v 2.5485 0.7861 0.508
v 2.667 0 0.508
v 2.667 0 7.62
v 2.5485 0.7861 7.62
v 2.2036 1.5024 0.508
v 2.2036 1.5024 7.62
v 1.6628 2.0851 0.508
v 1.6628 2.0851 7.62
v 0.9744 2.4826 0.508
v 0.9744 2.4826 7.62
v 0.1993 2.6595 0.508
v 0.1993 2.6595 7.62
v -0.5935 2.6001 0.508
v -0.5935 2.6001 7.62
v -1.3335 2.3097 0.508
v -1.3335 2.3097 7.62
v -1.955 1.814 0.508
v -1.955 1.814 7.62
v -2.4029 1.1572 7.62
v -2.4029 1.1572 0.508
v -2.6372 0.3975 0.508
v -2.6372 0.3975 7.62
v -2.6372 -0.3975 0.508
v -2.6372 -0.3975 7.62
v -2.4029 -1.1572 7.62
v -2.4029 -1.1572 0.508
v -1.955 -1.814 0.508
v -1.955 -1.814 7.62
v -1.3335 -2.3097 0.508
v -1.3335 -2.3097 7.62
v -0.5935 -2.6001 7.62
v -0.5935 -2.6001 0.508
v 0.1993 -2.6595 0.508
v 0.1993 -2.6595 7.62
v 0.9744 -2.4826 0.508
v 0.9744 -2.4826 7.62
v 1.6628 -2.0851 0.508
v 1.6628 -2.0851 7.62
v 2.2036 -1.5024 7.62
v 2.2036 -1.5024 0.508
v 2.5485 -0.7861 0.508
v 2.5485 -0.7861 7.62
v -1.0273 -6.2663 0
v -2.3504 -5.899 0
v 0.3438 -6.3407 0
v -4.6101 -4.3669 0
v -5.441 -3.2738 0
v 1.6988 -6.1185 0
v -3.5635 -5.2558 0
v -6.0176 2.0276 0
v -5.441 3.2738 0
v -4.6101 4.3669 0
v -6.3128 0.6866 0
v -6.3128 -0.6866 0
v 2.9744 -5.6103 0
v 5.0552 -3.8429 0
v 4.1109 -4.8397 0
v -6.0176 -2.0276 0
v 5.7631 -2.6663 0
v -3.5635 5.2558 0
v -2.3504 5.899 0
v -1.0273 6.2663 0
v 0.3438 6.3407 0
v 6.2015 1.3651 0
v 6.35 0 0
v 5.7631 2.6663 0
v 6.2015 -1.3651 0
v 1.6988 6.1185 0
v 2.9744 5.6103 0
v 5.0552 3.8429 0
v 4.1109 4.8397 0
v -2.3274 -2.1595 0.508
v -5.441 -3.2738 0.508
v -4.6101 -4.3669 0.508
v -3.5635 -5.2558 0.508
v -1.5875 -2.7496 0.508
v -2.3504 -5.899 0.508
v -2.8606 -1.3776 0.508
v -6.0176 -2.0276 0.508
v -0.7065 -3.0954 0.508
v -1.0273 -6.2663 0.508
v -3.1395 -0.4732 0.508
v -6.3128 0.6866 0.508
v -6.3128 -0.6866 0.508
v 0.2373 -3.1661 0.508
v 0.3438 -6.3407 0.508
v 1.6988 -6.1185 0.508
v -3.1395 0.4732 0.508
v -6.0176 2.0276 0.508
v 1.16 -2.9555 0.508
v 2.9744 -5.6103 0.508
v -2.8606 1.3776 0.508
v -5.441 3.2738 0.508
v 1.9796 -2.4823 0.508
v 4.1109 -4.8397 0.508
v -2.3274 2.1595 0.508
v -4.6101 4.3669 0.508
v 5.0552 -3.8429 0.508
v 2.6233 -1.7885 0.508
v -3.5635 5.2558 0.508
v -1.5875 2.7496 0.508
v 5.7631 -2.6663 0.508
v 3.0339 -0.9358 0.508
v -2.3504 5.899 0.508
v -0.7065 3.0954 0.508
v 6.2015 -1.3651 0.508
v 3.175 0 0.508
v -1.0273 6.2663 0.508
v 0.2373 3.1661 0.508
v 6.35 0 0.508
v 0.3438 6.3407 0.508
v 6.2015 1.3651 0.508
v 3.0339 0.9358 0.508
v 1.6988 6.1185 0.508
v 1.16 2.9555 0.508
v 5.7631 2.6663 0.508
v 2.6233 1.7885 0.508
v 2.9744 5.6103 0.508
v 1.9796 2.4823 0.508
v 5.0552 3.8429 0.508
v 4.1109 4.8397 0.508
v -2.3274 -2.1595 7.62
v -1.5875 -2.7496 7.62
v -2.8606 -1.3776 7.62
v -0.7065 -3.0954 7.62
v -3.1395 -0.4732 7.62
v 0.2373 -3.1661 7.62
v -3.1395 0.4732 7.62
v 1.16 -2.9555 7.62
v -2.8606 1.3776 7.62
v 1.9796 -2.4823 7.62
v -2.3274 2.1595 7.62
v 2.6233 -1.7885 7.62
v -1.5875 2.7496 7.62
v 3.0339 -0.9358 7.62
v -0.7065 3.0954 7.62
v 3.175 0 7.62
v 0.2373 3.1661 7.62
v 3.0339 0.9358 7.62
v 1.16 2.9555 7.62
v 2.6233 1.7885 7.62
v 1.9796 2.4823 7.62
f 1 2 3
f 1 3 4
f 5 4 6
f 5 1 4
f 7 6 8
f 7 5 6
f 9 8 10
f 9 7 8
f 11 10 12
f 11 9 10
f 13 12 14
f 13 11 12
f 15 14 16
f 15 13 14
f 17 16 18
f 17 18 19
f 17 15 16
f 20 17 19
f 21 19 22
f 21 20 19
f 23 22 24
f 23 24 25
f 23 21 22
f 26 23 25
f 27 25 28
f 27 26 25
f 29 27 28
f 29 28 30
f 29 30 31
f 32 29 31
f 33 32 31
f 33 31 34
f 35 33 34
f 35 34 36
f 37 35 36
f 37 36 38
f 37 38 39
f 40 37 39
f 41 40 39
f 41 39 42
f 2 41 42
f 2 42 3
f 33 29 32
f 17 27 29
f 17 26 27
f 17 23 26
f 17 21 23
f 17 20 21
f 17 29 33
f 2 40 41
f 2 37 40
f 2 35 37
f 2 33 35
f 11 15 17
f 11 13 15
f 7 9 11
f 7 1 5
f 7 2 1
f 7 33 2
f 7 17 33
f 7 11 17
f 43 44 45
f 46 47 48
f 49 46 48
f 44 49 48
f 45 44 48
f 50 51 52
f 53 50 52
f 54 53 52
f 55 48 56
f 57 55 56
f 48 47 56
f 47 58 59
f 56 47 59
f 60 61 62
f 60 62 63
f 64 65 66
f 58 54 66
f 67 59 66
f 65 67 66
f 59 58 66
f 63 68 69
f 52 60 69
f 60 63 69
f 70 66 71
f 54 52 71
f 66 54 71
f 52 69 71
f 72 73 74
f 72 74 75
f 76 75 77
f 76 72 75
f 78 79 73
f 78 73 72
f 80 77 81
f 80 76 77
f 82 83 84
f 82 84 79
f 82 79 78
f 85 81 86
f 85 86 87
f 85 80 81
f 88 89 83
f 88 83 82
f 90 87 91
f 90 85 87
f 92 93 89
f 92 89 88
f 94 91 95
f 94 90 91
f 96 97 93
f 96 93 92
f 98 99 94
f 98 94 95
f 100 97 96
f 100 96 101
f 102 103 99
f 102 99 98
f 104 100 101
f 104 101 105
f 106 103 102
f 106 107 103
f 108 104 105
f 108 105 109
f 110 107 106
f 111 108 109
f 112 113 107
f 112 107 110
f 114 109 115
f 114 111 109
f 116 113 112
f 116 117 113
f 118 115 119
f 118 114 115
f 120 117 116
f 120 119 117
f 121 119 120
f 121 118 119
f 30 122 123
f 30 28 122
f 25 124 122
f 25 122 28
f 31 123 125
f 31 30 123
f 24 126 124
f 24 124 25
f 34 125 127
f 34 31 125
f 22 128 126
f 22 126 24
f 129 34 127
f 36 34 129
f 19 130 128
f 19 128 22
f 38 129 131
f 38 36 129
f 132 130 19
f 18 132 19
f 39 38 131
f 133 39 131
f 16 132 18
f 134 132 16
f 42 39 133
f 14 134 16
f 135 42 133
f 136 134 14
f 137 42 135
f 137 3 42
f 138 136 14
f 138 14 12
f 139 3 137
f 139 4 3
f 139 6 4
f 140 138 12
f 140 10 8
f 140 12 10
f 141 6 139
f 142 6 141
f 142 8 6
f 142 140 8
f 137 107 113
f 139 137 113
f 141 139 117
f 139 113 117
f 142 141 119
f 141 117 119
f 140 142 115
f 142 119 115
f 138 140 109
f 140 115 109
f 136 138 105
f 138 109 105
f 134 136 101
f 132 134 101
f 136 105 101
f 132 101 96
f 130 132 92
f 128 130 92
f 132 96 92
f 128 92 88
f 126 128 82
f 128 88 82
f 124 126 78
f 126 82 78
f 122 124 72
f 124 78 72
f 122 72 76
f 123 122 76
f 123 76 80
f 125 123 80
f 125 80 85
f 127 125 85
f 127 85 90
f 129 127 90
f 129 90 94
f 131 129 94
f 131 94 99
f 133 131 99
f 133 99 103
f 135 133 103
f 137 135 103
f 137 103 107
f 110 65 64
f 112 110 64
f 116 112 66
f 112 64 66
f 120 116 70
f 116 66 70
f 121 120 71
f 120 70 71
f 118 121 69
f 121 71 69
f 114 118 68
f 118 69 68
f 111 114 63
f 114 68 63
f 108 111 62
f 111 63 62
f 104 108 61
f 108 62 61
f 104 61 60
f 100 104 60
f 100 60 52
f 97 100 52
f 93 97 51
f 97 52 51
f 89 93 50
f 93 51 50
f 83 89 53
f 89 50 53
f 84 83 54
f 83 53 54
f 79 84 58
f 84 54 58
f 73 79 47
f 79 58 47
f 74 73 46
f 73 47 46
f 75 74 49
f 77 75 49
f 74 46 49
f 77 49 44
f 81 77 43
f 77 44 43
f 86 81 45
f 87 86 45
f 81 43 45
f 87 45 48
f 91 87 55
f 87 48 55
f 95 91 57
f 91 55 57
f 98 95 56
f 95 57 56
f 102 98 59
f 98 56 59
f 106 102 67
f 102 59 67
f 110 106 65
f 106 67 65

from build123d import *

# Parameters (mm, degrees)
F0_R     = 3.175
F1_DEPTH = 7.62
F2_T     = -0.508
F0_R_2   = 6.35
F3_DEPTH = 0.508


with BuildPart() as f1:
    # F0 (on Top) → F1 (new body)
    with BuildSketch(Plane.XY):
        Circle(F0_R)
    extrude(amount=F1_DEPTH)

    # F2
    f2_openings = [f1.faces().sort_by_distance(p)[0] for p in [
        (0, 0, 7.62),
    ]]
    offset(amount=F2_T, openings=f2_openings)

    # F0 (on Top) → F3 (join)
    with BuildSketch(Plane.XY):
        Circle(F0_R_2)
        Circle(F0_R, mode=Mode.SUBTRACT)
    extrude(amount=F3_DEPTH)


solid = f1.part
